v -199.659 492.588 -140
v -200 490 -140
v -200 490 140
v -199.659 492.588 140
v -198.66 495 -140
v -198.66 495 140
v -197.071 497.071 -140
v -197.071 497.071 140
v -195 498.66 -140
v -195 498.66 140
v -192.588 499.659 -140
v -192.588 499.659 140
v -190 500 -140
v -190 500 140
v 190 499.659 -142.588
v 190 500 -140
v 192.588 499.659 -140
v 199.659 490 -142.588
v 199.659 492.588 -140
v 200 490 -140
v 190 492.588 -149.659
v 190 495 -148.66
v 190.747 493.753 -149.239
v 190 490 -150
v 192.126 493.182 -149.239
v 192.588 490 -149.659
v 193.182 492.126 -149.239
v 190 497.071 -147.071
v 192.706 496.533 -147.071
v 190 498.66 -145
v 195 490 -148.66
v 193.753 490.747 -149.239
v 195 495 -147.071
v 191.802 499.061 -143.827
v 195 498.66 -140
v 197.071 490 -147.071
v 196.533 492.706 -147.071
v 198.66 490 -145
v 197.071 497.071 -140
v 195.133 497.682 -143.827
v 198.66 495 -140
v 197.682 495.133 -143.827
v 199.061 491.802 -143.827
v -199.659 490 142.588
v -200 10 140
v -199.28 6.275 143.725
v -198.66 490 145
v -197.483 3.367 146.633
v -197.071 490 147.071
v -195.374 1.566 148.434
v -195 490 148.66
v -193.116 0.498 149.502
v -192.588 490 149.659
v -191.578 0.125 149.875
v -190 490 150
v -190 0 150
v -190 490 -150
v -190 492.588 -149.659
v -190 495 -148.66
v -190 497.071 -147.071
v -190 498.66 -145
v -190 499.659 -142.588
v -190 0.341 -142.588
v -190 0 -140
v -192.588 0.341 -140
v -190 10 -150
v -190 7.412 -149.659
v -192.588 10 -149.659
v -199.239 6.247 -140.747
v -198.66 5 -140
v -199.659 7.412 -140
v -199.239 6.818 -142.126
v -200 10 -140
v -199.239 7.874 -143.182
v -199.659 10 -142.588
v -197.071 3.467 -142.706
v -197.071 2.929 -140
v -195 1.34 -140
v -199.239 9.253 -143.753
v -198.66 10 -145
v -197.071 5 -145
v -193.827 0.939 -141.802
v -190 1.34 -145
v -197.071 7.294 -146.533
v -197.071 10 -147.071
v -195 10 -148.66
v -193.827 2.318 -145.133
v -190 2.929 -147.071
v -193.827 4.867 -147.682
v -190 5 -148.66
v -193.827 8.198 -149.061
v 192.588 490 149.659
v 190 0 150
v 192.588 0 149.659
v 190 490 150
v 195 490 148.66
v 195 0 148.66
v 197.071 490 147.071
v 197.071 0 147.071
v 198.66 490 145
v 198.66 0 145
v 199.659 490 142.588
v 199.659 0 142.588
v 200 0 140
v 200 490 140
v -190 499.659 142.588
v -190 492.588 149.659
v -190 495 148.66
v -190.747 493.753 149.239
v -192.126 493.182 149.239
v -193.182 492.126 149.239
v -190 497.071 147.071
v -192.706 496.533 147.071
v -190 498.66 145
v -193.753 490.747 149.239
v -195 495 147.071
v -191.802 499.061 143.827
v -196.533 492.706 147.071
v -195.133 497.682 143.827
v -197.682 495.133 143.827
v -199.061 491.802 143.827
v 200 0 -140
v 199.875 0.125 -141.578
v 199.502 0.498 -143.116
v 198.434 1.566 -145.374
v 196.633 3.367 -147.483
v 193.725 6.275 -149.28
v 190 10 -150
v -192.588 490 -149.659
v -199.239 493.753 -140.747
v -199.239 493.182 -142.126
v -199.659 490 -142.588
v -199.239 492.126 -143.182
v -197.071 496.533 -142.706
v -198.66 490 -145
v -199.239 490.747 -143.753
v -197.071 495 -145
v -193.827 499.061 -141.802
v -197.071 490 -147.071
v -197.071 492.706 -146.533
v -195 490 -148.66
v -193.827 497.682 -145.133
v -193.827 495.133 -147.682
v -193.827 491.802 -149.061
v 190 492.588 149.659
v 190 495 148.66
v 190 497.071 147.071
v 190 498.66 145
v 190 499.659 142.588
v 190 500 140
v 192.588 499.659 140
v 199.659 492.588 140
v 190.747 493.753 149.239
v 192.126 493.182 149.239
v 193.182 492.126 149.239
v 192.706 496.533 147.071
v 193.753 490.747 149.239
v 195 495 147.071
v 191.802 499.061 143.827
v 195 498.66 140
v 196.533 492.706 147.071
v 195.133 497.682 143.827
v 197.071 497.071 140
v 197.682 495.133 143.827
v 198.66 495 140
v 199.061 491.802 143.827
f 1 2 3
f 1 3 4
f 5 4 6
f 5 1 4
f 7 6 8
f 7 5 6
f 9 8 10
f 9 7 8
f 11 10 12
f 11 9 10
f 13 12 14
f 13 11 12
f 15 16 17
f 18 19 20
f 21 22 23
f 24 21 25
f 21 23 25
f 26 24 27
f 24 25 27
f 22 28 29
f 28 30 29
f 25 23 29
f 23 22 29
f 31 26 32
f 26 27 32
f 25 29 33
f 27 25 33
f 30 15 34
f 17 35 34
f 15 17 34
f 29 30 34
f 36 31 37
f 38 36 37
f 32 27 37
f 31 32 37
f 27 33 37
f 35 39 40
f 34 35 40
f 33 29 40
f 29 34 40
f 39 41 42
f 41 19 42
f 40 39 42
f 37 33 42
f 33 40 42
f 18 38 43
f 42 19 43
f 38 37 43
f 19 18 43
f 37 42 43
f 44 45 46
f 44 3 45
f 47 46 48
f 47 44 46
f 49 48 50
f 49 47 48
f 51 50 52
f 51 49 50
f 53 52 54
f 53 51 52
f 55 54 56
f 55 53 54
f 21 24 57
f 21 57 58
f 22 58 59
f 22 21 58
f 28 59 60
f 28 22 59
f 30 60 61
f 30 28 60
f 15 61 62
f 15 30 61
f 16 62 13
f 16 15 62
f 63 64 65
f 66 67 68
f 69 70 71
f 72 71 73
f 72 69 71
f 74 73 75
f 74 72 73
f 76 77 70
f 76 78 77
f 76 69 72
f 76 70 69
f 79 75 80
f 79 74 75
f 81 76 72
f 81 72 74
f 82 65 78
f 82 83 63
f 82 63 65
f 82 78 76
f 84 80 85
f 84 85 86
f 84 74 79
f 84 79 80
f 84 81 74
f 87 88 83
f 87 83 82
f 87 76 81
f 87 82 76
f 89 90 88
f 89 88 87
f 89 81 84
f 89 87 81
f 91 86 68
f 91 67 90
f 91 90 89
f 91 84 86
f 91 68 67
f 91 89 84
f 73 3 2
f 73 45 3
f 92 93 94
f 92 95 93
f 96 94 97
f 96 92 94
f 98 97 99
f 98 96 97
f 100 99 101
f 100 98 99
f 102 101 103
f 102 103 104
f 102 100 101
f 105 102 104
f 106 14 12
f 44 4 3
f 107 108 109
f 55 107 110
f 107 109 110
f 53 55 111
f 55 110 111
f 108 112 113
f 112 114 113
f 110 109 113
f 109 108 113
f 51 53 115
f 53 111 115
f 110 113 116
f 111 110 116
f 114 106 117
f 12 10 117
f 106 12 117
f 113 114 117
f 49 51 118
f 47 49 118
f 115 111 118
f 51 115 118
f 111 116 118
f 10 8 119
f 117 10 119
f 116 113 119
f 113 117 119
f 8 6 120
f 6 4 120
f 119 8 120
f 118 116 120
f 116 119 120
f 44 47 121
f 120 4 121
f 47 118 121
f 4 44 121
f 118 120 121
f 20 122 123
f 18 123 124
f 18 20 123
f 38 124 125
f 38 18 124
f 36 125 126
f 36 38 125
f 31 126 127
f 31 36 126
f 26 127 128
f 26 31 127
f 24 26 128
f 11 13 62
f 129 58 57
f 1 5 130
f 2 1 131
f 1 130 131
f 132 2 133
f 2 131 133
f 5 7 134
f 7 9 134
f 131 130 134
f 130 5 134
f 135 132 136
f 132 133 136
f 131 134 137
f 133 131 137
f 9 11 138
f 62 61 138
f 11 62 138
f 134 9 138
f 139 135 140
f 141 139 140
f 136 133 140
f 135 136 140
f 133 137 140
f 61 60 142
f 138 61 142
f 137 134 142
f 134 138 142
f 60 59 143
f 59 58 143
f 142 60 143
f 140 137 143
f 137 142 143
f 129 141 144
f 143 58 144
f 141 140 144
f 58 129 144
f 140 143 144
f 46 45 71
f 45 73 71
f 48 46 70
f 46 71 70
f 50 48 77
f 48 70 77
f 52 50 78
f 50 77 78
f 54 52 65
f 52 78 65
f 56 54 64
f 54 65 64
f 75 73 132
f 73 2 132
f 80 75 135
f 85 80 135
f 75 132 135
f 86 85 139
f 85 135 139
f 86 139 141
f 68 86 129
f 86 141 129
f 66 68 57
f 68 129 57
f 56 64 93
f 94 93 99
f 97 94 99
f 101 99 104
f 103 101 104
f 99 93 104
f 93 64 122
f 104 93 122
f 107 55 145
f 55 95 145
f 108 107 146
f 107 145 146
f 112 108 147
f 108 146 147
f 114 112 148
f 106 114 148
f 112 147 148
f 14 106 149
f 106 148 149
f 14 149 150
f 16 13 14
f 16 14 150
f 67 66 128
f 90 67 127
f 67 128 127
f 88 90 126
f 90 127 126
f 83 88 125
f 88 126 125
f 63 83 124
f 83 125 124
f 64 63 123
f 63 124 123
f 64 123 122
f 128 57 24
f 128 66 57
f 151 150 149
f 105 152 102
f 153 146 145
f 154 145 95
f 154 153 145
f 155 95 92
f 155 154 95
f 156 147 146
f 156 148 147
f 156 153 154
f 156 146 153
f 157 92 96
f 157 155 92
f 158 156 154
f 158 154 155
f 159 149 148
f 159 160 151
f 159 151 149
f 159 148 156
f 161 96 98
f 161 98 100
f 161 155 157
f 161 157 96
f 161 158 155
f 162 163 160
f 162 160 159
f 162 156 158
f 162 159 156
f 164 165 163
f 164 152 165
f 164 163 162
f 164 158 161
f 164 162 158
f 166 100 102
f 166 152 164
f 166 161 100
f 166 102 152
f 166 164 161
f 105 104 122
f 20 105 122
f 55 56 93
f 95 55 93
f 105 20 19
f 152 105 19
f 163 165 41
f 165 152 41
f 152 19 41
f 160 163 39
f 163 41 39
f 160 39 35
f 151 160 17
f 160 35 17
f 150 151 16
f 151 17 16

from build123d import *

# Parameters (mm, degrees)
SKETCH_1_W      = 400
SKETCH_1_H      = 300
EXTRUDE_1_DEPTH = 500
FILLET_1_R      = 10


with BuildPart() as part:
    # 草图1 → 凸台-拉伸1 (new body)
    with BuildSketch(Plane(origin=(0, 0, 0), x_dir=(1, 0, 0), z_dir=(0, 1, 0))):
        Rectangle(SKETCH_1_W, SKETCH_1_H)
    extrude(amount=EXTRUDE_1_DEPTH)

    # 圆角1
    fillet_1_edges = [part.edges().sort_by_distance(p)[0] for p in [
        (200, 500, 0),
        (0, 500, -150),
        (-200, 500, 0),
        (0, 0, -150),
        (-200, 0, 0),
        (0, 500, 150),
        (-200, 250, -150),
        (200, 250, -150),
        (200, 250, 150),
        (-200, 250, 150),
    ]]
    fillet(fillet_1_edges, radius=FILLET_1_R)


solid = part.part
